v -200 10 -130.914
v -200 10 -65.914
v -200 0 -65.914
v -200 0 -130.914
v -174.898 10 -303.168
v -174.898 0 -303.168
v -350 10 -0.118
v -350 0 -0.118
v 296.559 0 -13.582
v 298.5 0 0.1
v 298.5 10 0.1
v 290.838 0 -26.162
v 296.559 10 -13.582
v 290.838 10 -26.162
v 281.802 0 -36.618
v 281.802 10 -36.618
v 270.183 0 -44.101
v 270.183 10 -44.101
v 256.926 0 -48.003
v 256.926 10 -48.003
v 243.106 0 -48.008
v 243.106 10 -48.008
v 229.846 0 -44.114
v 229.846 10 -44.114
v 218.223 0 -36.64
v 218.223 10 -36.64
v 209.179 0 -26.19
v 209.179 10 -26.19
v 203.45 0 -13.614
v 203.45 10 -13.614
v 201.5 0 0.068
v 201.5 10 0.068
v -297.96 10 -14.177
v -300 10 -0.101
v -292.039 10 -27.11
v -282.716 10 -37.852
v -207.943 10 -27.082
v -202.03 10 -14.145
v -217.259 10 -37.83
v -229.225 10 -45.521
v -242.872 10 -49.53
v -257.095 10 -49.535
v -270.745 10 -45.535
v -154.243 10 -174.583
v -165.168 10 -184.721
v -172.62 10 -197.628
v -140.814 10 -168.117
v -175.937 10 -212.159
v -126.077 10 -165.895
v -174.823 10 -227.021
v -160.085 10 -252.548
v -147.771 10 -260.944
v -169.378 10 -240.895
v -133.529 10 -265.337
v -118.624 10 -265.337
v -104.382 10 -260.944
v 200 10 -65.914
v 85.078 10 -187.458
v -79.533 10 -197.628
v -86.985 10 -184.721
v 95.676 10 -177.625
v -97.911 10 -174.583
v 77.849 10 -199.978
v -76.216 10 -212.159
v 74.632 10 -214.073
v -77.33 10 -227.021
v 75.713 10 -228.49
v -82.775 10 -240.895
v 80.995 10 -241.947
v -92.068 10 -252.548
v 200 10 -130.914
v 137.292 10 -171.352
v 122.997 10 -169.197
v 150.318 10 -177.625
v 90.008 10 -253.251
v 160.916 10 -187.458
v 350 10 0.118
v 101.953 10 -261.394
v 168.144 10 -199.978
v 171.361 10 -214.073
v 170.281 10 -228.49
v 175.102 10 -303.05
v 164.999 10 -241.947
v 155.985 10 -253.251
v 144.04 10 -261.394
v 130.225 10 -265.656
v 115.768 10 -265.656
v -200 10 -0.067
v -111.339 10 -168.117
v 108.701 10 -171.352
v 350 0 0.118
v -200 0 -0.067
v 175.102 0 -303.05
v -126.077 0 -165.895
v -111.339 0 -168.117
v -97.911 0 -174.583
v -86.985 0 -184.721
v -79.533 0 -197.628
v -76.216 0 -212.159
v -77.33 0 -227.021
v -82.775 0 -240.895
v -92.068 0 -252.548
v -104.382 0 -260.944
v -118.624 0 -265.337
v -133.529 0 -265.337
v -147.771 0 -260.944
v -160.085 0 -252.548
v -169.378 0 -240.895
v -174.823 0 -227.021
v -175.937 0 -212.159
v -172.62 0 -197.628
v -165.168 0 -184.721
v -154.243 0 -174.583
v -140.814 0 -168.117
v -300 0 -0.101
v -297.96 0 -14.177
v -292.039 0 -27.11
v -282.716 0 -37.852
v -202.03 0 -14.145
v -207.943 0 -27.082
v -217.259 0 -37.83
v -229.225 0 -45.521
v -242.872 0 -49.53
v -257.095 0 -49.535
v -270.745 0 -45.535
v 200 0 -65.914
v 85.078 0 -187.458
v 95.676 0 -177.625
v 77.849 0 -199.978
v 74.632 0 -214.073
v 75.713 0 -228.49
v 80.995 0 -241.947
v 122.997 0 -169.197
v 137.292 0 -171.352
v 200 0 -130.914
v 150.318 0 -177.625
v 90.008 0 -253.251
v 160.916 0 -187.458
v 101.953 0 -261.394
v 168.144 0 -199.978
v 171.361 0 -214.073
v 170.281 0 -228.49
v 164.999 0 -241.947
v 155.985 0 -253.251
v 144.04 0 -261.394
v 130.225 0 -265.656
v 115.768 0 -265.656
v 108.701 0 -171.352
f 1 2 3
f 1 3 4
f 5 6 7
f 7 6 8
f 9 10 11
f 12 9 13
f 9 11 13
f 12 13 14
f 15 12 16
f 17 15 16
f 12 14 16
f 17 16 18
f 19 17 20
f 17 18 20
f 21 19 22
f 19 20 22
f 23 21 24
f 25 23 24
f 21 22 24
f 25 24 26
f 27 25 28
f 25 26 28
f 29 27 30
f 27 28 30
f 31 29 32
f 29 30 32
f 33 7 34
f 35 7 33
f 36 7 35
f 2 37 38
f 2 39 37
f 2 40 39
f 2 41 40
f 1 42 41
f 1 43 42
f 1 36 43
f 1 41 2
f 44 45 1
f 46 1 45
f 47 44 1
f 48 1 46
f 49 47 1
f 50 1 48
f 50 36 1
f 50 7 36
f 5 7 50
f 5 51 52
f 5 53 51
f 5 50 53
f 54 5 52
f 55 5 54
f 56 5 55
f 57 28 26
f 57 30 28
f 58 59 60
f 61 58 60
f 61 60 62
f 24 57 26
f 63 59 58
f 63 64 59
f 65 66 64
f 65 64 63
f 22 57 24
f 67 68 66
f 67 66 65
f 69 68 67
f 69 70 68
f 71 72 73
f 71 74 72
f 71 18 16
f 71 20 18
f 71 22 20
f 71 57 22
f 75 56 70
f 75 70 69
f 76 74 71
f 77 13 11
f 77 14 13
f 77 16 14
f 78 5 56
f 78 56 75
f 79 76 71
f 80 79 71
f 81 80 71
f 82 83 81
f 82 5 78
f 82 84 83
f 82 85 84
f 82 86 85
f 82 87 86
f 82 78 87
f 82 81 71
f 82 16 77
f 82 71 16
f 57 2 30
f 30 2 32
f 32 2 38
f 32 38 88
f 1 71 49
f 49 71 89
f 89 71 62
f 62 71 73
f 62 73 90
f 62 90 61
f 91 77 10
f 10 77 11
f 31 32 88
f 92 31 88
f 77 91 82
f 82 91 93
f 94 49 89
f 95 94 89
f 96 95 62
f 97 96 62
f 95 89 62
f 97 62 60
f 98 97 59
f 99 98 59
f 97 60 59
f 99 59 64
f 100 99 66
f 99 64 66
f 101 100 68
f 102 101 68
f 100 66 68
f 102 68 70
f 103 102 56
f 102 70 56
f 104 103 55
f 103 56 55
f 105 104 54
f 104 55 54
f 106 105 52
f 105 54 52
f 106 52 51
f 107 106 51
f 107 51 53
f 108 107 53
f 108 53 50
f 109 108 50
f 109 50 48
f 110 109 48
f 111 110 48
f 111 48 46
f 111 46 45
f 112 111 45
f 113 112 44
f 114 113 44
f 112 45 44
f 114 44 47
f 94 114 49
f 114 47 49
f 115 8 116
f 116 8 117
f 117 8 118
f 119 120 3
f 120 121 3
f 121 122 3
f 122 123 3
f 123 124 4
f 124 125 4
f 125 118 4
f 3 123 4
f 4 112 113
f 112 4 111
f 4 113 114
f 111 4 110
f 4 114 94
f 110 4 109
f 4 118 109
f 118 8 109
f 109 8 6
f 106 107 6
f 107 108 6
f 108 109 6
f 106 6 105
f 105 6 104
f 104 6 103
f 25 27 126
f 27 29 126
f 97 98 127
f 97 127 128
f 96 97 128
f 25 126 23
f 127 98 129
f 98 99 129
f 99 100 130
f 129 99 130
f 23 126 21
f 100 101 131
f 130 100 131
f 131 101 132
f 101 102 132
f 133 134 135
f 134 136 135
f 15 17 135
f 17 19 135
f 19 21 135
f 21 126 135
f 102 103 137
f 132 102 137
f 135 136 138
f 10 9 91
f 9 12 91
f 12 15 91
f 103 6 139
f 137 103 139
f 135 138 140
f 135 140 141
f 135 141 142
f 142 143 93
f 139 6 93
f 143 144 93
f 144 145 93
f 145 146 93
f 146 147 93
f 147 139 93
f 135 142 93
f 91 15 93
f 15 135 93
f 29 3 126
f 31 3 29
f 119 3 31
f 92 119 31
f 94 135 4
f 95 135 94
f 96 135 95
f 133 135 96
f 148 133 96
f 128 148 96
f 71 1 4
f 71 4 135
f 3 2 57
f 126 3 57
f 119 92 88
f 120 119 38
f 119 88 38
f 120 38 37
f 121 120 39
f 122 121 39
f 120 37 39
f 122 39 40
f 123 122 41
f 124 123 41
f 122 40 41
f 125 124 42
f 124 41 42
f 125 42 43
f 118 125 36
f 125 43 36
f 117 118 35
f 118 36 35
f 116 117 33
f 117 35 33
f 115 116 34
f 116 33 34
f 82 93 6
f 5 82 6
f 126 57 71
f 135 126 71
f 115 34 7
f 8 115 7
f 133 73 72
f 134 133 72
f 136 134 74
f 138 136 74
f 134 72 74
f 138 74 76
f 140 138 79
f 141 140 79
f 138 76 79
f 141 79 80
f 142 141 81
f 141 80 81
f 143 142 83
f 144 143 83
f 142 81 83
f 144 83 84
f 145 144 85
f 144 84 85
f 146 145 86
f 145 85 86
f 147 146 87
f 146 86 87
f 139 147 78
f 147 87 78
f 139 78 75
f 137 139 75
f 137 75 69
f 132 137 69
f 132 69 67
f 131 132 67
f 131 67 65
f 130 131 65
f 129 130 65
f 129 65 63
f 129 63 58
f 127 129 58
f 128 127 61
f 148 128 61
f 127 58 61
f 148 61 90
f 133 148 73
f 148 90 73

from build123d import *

# Parameters (mm, degrees)
BOSS_EXTRUDE1_DEPTH = 10
SKETCH3_R           = 48.5
SKETCH3_R_2         = 50
SKETCH3_W           = 400
SKETCH3_H           = 65
CUT_EXTRUDE3_DEPTH  = 10
CUT_EXTRUDE4_DEPTH  = 10


with BuildPart() as part:
    # Sketch1 → Boss-Extrude1 (new body)
    with BuildSketch(Plane(origin=(0, 0, 0), x_dir=(1, 0, 0), z_dir=(0, 1, 0))):
        Polygon((175.101753381, 303.050121206), (-174.898226894, 303.167627278), (-349.999980275, 0.117506072), (-175.101753381, -303.050121206), (174.898226894, -303.167627278), (349.999980275, -0.117506072), align=None)
    extrude(amount=BOSS_EXTRUDE1_DEPTH)

    # Sketch3 → Cut-Extrude3 (cut)
    with BuildSketch(Plane(origin=(0, 10, 0), x_dir=(1, 0, 0), z_dir=(0, 1, 0))):
        with Locations(Location((249.999980275, 0, 0), (0, 0, 270))):
            Circle(SKETCH3_R)
        with Locations(Location((-250.000009417, 0.041161845, 0), (0, 0, 270))):
            Circle(SKETCH3_R_2)
        with Locations(Location((-126.076603066, 215.895357646, 0), (0, 0, 270))):
            Circle(SKETCH3_R_2)
        with Locations(Location((122.996764387, 217.697498973, 0), (0, 0, 270))):
            Circle(SKETCH3_R)
        with Locations((0, 98.413699872)):
            Rectangle(SKETCH3_W, SKETCH3_H)
    extrude(amount=-CUT_EXTRUDE3_DEPTH, mode=Mode.SUBTRACT)

    # Sketch2 → Cut-Extrude4 (cut)
    with BuildSketch(Plane(origin=(0, 10, 0), x_dir=(1, 0, 0), z_dir=(0, 1, 0))):
        Polygon((-175.101753381, -303.050121206), (174.898226894, -303.167627278), (349.999980275, -0.117506072), (-349.999980275, 0.117506072), align=None)
    extrude(amount=-CUT_EXTRUDE4_DEPTH, mode=Mode.SUBTRACT)


solid = part.part
